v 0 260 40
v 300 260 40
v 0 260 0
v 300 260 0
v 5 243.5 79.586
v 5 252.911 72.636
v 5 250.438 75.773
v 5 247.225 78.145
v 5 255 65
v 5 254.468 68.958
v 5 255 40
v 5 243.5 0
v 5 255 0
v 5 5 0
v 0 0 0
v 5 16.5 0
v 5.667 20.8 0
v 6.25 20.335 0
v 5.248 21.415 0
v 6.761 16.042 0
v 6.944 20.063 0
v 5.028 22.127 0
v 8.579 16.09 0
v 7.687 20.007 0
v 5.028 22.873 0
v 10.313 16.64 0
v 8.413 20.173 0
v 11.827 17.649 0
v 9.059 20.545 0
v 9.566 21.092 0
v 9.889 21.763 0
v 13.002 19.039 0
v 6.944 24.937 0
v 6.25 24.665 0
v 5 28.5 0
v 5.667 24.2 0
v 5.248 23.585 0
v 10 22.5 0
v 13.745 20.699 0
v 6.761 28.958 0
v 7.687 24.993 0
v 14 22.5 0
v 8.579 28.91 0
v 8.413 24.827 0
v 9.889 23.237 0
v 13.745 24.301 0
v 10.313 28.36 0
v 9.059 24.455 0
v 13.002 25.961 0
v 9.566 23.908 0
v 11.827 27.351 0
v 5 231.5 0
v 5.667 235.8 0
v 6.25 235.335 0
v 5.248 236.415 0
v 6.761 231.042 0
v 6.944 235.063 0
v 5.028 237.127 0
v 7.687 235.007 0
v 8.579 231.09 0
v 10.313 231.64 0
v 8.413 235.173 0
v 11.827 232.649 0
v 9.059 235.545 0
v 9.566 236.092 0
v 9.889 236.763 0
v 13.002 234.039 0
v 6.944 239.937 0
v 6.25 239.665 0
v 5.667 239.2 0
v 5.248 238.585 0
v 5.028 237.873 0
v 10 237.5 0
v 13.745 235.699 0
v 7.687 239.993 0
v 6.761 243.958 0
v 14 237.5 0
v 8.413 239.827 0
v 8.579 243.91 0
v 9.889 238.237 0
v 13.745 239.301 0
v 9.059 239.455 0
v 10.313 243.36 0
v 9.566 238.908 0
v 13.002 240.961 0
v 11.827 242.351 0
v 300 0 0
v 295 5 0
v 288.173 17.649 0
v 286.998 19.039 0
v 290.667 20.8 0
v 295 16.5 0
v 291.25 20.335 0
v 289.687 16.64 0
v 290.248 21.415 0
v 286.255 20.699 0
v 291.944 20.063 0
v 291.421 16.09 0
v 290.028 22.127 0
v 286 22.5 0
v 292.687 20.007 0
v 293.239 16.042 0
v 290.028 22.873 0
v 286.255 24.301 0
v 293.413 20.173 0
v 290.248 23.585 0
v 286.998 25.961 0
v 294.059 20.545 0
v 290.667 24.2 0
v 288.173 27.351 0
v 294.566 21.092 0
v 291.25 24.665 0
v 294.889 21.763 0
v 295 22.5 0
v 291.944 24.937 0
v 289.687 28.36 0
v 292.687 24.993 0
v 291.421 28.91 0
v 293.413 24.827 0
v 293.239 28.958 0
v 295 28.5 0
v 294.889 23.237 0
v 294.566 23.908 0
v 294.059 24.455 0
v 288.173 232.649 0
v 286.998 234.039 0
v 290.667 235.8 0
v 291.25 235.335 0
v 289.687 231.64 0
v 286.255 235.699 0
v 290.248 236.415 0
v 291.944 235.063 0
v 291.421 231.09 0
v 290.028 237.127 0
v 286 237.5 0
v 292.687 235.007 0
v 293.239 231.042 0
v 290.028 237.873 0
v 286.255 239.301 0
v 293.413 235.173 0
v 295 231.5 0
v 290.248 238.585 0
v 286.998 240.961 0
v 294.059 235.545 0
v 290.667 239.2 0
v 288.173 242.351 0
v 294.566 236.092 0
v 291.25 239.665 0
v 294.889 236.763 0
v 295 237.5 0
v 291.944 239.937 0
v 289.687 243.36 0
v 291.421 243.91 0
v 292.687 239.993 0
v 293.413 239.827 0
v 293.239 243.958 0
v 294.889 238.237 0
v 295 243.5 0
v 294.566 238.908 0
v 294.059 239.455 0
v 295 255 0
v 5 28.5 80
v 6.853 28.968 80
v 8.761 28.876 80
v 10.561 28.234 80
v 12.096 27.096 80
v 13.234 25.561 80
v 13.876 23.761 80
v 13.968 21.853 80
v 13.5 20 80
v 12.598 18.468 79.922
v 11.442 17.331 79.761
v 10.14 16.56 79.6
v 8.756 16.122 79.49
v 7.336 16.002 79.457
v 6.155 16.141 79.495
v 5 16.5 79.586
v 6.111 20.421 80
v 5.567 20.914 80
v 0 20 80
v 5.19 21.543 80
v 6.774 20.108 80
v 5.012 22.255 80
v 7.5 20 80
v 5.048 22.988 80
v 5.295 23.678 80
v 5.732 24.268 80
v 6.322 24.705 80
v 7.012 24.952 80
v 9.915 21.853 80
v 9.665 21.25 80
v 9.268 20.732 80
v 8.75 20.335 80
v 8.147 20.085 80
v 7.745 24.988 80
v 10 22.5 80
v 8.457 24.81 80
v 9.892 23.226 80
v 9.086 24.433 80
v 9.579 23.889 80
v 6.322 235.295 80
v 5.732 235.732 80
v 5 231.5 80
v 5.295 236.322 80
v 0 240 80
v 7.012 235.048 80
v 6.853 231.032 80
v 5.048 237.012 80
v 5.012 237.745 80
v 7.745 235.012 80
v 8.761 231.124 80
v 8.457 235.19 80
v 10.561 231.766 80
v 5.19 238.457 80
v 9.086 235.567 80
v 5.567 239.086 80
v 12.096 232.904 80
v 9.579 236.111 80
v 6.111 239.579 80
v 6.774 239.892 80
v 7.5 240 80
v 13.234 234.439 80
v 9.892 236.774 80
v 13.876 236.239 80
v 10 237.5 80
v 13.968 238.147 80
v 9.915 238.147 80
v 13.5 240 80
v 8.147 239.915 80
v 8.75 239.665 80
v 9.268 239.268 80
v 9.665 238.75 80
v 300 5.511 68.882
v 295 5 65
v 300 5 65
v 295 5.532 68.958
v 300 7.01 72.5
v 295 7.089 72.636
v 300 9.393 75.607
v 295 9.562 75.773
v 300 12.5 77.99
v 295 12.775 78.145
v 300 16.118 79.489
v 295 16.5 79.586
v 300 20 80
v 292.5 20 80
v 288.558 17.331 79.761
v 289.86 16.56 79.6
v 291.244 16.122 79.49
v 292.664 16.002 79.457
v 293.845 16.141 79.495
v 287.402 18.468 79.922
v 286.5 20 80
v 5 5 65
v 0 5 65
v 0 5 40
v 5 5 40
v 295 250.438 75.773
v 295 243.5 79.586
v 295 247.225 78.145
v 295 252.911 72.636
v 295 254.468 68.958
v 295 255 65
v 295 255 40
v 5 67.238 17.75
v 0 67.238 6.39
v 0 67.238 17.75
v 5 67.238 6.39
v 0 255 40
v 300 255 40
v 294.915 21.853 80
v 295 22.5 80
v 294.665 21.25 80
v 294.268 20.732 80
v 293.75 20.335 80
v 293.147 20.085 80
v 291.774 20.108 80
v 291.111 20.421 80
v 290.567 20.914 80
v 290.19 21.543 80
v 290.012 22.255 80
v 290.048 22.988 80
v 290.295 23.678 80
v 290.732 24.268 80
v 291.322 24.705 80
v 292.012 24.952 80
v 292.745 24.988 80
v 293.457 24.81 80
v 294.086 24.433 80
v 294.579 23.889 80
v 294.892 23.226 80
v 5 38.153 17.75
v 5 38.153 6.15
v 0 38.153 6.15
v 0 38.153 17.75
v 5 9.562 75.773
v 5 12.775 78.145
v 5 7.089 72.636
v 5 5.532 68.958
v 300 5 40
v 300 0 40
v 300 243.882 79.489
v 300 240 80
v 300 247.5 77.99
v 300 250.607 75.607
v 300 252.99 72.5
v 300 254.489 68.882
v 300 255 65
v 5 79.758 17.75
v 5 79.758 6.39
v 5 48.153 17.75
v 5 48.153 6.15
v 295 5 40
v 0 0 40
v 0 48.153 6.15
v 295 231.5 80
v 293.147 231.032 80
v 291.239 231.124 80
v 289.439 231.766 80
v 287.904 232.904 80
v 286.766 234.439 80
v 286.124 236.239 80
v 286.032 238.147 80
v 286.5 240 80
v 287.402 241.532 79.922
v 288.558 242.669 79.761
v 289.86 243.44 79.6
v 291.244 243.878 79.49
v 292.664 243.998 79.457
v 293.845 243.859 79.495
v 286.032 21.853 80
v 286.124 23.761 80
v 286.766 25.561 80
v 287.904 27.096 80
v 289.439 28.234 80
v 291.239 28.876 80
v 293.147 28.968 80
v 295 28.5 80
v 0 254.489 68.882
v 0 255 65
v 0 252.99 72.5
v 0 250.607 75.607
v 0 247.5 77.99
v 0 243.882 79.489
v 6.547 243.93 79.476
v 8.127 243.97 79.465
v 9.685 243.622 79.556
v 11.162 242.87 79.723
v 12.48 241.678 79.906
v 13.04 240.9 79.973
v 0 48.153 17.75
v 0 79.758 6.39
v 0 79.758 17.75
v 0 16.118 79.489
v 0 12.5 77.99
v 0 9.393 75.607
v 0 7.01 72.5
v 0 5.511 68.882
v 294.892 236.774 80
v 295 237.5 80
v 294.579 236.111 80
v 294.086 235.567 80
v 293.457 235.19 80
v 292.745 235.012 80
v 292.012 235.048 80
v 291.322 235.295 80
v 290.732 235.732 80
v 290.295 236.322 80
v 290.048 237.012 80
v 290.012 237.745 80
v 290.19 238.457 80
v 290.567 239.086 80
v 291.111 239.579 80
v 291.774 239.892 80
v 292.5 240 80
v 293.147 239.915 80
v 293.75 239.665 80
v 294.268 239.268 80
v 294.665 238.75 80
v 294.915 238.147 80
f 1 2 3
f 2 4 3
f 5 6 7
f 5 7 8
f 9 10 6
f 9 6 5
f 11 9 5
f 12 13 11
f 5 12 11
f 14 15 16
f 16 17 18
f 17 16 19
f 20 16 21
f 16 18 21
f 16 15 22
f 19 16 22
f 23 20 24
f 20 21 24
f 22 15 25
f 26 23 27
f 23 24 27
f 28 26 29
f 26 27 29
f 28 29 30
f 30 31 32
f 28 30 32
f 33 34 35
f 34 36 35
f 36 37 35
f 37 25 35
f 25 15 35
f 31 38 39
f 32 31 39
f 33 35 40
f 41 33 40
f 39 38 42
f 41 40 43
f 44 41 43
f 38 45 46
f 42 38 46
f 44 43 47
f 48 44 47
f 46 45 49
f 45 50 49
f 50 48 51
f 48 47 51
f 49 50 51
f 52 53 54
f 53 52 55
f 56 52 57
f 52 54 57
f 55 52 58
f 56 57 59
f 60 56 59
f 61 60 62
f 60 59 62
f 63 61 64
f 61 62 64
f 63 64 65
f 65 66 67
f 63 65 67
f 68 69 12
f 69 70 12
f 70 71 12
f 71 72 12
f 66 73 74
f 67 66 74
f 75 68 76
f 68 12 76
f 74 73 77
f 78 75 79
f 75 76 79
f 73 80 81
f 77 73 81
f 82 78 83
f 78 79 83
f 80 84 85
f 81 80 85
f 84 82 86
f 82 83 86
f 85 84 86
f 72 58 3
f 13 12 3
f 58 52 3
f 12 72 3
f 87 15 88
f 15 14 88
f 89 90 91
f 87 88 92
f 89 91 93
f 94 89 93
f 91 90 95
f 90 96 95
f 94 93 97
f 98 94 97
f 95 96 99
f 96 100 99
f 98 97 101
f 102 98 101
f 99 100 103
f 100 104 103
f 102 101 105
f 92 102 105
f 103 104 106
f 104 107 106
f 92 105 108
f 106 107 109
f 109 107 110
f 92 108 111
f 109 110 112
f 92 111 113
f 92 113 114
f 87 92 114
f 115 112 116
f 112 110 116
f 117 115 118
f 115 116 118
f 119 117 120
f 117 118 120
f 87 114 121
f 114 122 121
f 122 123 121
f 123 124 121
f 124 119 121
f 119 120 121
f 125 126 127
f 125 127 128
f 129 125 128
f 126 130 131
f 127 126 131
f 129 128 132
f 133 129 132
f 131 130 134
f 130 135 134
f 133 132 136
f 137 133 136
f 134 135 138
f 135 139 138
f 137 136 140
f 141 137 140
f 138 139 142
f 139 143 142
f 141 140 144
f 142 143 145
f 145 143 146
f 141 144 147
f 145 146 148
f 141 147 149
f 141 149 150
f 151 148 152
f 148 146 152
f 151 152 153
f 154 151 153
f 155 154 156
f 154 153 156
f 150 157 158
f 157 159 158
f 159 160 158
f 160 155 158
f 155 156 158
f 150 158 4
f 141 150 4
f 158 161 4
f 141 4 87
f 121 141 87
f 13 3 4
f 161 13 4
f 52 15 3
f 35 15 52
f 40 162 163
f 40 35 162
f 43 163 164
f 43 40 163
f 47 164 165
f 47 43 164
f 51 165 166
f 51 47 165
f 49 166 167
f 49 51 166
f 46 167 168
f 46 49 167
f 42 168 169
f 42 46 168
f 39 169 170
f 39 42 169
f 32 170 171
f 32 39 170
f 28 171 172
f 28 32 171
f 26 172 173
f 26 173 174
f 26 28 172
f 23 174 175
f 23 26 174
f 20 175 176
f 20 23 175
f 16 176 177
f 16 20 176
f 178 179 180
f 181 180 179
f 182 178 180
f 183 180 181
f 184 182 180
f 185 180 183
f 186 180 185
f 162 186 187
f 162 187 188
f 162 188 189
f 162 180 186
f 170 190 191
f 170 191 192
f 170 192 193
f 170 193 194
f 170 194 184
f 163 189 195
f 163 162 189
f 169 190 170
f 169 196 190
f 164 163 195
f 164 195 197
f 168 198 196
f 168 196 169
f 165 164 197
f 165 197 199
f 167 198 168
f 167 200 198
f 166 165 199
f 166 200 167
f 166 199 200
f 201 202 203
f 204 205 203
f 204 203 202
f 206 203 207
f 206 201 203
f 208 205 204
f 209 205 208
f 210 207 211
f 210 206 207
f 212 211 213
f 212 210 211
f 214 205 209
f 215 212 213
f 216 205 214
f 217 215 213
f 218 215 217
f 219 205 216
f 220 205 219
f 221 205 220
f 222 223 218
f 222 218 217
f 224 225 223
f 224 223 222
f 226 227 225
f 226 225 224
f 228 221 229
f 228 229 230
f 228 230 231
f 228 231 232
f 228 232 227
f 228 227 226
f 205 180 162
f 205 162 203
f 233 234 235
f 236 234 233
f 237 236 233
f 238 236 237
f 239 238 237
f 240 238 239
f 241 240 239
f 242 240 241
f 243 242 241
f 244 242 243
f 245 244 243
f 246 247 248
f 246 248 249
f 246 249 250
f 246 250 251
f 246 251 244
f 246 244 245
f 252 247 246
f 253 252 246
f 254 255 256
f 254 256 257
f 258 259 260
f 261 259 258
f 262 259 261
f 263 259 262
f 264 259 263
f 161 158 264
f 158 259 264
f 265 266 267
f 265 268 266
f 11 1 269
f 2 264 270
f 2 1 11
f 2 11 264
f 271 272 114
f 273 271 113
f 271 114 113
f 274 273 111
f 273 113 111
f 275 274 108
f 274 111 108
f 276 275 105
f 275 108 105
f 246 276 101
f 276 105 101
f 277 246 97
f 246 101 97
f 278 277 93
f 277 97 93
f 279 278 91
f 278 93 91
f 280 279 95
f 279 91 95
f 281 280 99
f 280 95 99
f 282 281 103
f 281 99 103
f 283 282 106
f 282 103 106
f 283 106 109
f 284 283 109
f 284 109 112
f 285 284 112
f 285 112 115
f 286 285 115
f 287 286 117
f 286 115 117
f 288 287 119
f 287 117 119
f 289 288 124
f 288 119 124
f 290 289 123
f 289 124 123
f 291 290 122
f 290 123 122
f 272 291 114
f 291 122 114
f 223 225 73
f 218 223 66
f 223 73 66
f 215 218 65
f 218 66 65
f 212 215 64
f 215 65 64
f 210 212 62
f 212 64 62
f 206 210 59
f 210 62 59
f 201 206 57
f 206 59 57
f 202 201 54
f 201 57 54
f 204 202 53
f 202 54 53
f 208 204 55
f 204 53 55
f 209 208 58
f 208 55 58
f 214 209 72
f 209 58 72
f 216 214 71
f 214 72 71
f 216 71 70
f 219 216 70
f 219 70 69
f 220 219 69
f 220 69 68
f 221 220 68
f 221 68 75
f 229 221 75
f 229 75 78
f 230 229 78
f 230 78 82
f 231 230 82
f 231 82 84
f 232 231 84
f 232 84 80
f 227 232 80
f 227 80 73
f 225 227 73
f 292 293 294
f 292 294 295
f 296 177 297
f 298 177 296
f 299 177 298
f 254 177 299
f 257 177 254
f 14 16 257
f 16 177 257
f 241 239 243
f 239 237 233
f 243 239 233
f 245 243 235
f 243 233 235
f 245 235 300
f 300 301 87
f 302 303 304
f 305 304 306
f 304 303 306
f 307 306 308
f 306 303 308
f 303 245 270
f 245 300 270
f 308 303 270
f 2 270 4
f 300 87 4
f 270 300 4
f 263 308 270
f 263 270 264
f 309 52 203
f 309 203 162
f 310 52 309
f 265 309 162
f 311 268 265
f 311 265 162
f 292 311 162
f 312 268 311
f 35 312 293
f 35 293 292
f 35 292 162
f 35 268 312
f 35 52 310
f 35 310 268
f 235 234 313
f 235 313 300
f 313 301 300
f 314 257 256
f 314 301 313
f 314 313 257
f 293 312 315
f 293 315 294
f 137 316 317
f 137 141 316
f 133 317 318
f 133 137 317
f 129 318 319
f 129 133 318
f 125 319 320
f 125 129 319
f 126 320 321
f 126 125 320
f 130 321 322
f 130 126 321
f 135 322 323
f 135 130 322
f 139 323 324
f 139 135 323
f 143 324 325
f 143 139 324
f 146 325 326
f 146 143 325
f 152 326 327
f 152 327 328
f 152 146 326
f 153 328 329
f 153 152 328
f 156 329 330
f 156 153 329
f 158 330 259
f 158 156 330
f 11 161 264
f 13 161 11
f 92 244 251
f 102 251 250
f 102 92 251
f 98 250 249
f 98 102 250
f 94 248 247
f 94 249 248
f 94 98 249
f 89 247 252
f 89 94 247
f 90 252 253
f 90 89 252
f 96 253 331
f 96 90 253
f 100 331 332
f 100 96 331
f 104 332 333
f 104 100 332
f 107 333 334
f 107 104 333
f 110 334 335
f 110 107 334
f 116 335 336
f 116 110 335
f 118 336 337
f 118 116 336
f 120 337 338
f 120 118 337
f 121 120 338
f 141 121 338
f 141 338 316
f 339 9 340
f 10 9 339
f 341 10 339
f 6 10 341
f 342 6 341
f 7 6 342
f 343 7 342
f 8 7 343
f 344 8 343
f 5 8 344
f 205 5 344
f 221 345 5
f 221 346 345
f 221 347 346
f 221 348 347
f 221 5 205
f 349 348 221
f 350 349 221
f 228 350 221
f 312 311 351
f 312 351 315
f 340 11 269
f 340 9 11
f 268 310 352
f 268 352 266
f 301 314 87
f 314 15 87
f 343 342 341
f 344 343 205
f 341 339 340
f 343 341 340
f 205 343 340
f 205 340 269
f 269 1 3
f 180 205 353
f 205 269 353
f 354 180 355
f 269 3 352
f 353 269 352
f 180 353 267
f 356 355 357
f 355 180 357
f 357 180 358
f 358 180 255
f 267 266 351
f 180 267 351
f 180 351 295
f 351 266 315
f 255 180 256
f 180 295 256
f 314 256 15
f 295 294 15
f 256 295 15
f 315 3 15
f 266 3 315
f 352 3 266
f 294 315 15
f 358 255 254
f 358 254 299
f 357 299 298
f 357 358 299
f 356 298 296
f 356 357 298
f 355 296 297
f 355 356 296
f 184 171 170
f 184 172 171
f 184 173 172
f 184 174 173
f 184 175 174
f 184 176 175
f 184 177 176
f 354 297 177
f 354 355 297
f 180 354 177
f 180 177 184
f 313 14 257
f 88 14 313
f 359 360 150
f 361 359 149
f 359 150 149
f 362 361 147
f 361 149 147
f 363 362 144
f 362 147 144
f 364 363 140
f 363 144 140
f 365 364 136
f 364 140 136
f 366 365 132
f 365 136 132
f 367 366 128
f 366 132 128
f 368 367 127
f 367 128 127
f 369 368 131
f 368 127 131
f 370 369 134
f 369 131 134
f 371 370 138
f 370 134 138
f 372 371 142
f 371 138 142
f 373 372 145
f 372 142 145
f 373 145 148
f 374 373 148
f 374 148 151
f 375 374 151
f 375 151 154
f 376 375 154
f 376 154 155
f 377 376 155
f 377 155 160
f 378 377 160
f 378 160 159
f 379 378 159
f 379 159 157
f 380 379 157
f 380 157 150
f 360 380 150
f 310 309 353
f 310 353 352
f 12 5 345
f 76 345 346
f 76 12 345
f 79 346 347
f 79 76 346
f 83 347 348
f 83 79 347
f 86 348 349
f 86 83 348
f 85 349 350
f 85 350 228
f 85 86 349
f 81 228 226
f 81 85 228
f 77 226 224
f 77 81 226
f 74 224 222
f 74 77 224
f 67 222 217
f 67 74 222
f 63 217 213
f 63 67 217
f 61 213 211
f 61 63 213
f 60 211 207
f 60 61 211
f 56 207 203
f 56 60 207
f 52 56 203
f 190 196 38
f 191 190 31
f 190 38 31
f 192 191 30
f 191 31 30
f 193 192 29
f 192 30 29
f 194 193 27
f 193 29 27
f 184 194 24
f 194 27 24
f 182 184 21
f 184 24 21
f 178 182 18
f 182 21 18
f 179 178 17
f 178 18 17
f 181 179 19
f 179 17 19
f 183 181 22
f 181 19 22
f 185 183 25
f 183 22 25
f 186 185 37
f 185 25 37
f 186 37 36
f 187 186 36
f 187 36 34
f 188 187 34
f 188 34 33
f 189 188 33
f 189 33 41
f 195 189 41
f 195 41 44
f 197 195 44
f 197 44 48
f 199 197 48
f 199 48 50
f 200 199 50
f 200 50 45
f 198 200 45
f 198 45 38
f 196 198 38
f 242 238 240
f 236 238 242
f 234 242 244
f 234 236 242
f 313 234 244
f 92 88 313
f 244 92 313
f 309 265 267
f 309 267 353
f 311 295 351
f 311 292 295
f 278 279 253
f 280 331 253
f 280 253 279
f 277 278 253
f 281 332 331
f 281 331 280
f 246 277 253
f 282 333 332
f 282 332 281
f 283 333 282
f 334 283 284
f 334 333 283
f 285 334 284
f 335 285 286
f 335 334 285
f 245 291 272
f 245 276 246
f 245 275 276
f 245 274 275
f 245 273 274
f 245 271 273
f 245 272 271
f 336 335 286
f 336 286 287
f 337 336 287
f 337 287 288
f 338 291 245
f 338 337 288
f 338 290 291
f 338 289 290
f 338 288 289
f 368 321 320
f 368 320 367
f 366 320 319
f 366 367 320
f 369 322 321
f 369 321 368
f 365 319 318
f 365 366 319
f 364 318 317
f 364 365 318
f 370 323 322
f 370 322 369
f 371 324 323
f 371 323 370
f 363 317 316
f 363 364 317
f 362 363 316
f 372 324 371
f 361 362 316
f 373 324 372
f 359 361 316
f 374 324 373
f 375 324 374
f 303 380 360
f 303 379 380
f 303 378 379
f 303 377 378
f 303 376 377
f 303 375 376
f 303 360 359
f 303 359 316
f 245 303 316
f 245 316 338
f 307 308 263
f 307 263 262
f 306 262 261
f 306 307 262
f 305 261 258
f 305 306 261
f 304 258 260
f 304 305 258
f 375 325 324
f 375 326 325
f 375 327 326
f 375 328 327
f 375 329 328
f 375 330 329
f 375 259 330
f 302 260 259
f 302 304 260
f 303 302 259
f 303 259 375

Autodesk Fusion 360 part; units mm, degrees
sketch "Sketch1" plane through (0, 0, 0) normal (0, 0, 1) x (1, 0, 0)
  line L0 (0, 0) -> (300, 0)
  line L1 (300, 0) -> (300, 260)
  line L2 (300, 260) -> (0, 260)
  line L3 (0, 260) -> (0, 0)
  line L4 (5, 5) -> (295, 5)
  line L5 (295, 5) -> (295, 255)
  line L6 (295, 255) -> (5, 255)
  line L7 (5, 255) -> (5, 5)
  circle A0 centre (7.5, 22.5) radius 2.5
  circle A1 centre (7.5, 237.5) radius 2.5
  circle A2 centre (292.5, 237.5) radius 2.5
  circle A3 centre (292.5, 22.5) radius 2.5
  circle A4 centre (7.5, 237.5) radius 6.5
  circle A5 centre (292.5, 237.5) radius 6.5
  circle A6 centre (292.5, 22.5) radius 6.5
  circle A7 centre (7.5, 22.5) radius 6.5
  dimension "d1" = 300
  dimension "d2" = 260
  dimension "d3" = 290
  dimension "d4" = 250
  dimension "d5" = 5
  dimension "d6" = 5
  dimension "d7" = 5
  dimension "d8" = 5
  dimension "d9" = 5
  dimension "d10" = 5
  dimension "d11" = 5
  dimension "d12" = 5
  dimension "d13" = 22.5
  dimension "d16" = 22.5
  dimension "d17" = 7.5
  dimension "d18" = 7.5
  dimension "d19" = 7.5
  dimension "d20" = 22.5
  dimension "d21" = 7.5
  dimension "d22" = 22.5
  dimension "d23" = 13
  dimension "d24" = 7.5
  dimension "d25" = 22.5
  dimension "d26" = 13
  dimension "d27" = 7.5
  dimension "d28" = 22.5
  dimension "d29" = 13
  dimension "d30" = 7.5
  dimension "d31" = 22.5
  dimension "d32" = 13
  dimension "d33" = 7.5
  dimension "d34" = 22.5
extrude "Extrude1" add sketch "Sketch1" along normal blind 80 contours L7 A7 picked at (9.3974, 27.2942) makes body 1
extrude "Extrude2" add sketch "Sketch1" along normal blind 80 separate body contours L5 A6 picked at (287.3448, 22.5) makes body 2
extrude "Extrude3" add sketch "Sketch1" along normal blind 80 separate body contours L5 A5 picked at (287.3448, 237.5) makes body 3
extrude "Extrude4" add sketch "Sketch1" along normal blind 80 separate body contours L7 A4 picked at (9.3974, 242.2942) makes body 4
extrude "Extrude5" add sketch "Sketch1" along normal blind 80 separate body contours L0 L1 L2 L3 makes body 5
extrude "Extrude6" add sketch "Sketch1" along normal blind 80 contours L7 A4 picked at (2.3567, 237.1826) bodies 4 5
extrude "Extrude7" add sketch "Sketch1" along normal blind 80 contours L7 A7 picked at (2.3567, 22.1826) bodies 1 4
extrude "Extrude8" add sketch "Sketch1" along normal blind 80 contours L5 A6 picked at (297.6433, 22.8174) bodies 1 2
extrude "Extrude9" add sketch "Sketch1" along normal blind 80 contours L5 A5 picked at (297.6433, 237.1826) bodies 1 3
sketch "Sketch2" plane through (5, 0, 0) normal (1, 0, 0) x (0, 1, 0)
  line L0 (28.5, 0) -> (231.5, 0)
  line L1 (231.5, 0) -> (231.5, 80)
  line L2 (231.5, 80) -> (28.5, 80)
  line L3 (28.5, 80) -> (28.5, 0)
  line L4 (35, 30) -> (89.718, 30)
  line L5 (89.718, 30) -> (89.718, 0)
  line L6 (89.718, 0) -> (35, 0)
  line L7 (35, 0) -> (35, 30)
  line L8 (5, 0) -> (5, 80)
  line L9 (67.238, 17.75) -> (79.758, 17.75)
  line L10 (79.758, 17.75) -> (79.758, 6.39)
  line L11 (79.758, 6.39) -> (67.238, 6.39)
  line L12 (67.238, 6.39) -> (67.238, 17.75)
  line L13 (38.153, 17.75) -> (48.153, 17.75)
  line L14 (48.153, 17.75) -> (48.153, 6.15)
  line L15 (48.153, 6.15) -> (38.153, 6.15)
  line L16 (38.153, 6.15) -> (38.153, 17.75)
  dimension "d53" = 54.718
  dimension "d56" = 30
  dimension "d57" = 50
  dimension "d58" = 30
  dimension "d59" = 12.52
  dimension "d60" = 10
  dimension "d61" = 9.96
  dimension "d62" = 6.39
  dimension "d63" = 6.15
  dimension "d64" = 19.085
  dimension "d65" = 11.36
  dimension "d66" = 11.6
extrude "Extrude10" cut sketch "Sketch2" against normal blind 5 contours L9 L10 L11 L12 bodies 1
extrude "Extrude11" cut sketch "Sketch2" against normal blind 5 contours L13 L14 L15 L16 bodies 1
sketch "Sketch3" plane through (0, 260, 0) normal (0, 1, 0) x (-1, 0, 0)
  line L0 (-300, 0) -> (0, 0)
  line L1 (0, 0) -> (0, 80)
  line L2 (0, 80) -> (-300, 80)
  line L3 (-300, 80) -> (-300, 0)
  line L4 (-295, 80) -> (-5, 80)
  line L5 (-5, 80) -> (-5, 40)
  line L6 (-5, 40) -> (-295, 40)
  line L7 (-295, 40) -> (-295, 80)
  line L8 (-300, 0) -> (0, 0)
  line L9 (-295, 40) -> (-300, 40)
  line L10 (-300, 40) -> (-300, 80)
  line L11 (-300, 80) -> (-295, 80)
  line L12 (-295, 80) -> (-295, 40)
  line L13 (-5, 40) -> (0, 40)
  line L14 (0, 40) -> (0, 80)
  line L15 (0, 80) -> (-5, 80)
  line L16 (-5, 80) -> (-5, 40)
  dimension "d71" = 290
  dimension "d72" = 5
  dimension "d73" = 5
  dimension "d74" = 40
  dimension "d92" = 5
  dimension "d93" = 40
  dimension "d94" = 5
  dimension "d95" = 40
extrude "Extrude12" cut sketch "Sketch3" against normal blind 5 contours L2 L4 L5 L6 L7 L12 L16 bodies 1
sketch "Sketch4" plane through (0, 0, 0) normal (0, -1, 0) x (1, 0, 0)
  line L0 (0, 0) -> (300, 0)
  line L1 (300, 0) -> (300, 80)
  line L2 (300, 80) -> (0, 80)
  line L3 (0, 80) -> (0, 0)
  line L4 (5, 80) -> (295, 80)
  line L5 (295, 80) -> (295, 40)
  line L6 (295, 40) -> (5, 40)
  line L7 (5, 40) -> (5, 80)
  line L8 (0, 0) -> (300, 0)
  line L9 (5, 80) -> (0, 80)
  line L10 (0, 80) -> (0, 40)
  line L11 (0, 40) -> (5, 40)
  line L12 (5, 40) -> (5, 80)
  line L13 (295, 40) -> (300, 40)
  line L14 (300, 40) -> (300, 80)
  line L15 (300, 80) -> (295, 80)
  line L16 (295, 80) -> (295, 40)
  dimension "d77" = 290
  dimension "d78" = 40
  dimension "d79" = 40
  dimension "d80" = 5
  dimension "d81" = 5
  dimension "d84" = 5
  dimension "d85" = 40
  dimension "d86" = 5
  dimension "d87" = 40
extrude "Extrude13" cut sketch "Sketch4" against normal blind 5 contours L2 L4 L5 L6 L7 L12 L16 bodies 1
sketch "Sketch5" plane through (0, 0, 0) normal (-1, 0, 0) x (0, -1, 0)
  line L0 (-48.153, 6.15) -> (-48.153, 17.75)
  line L1 (-48.153, 17.75) -> (-38.153, 17.75)
  line L2 (-38.153, 17.75) -> (-38.153, 6.15)
  line L3 (-38.153, 6.15) -> (-48.153, 6.15)
  line L4 (-79.758, 6.39) -> (-79.758, 17.75)
  line L5 (-79.758, 17.75) -> (-67.238, 17.75)
  line L6 (-67.238, 17.75) -> (-67.238, 6.39)
  line L7 (-67.238, 6.39) -> (-79.758, 6.39)
  line L8 (-260, 0) -> (0, 0)
  line L9 (0, 0) -> (0, 80)
  line L10 (0, 80) -> (-260, 80)
  line L11 (-260, 80) -> (-260, 0)
extrude "Extrude14" cut sketch "Sketch4" against normal blind 5 contours L1 L2 L5 L13 L14 L15 L16 bodies 1
extrude "Extrude15" cut sketch "Sketch4" against normal blind 5 contours L2 L3 L7 L9 L10 L11 L12 bodies 1
extrude "Extrude16" cut sketch "Sketch3" against normal blind 5 contours L1 L2 L5 L13 L14 L15 L16 bodies 1
extrude "Extrude17" cut sketch "Sketch3" against normal blind 5 contours L2 L3 L7 L9 L10 L11 L12 bodies 1
fillet "Fillet1" radius 15 1 edges at (297.5, 5, 80) on bodies 1
fillet "Fillet2" radius 15 1 edges at (297.5, 255, 80) on bodies 1
fillet "Fillet3" radius 15 1 edges at (2.5, 255, 80) on bodies 1
fillet "Fillet4" radius 15 1 edges at (2.5, 5, 80) on bodies 1
